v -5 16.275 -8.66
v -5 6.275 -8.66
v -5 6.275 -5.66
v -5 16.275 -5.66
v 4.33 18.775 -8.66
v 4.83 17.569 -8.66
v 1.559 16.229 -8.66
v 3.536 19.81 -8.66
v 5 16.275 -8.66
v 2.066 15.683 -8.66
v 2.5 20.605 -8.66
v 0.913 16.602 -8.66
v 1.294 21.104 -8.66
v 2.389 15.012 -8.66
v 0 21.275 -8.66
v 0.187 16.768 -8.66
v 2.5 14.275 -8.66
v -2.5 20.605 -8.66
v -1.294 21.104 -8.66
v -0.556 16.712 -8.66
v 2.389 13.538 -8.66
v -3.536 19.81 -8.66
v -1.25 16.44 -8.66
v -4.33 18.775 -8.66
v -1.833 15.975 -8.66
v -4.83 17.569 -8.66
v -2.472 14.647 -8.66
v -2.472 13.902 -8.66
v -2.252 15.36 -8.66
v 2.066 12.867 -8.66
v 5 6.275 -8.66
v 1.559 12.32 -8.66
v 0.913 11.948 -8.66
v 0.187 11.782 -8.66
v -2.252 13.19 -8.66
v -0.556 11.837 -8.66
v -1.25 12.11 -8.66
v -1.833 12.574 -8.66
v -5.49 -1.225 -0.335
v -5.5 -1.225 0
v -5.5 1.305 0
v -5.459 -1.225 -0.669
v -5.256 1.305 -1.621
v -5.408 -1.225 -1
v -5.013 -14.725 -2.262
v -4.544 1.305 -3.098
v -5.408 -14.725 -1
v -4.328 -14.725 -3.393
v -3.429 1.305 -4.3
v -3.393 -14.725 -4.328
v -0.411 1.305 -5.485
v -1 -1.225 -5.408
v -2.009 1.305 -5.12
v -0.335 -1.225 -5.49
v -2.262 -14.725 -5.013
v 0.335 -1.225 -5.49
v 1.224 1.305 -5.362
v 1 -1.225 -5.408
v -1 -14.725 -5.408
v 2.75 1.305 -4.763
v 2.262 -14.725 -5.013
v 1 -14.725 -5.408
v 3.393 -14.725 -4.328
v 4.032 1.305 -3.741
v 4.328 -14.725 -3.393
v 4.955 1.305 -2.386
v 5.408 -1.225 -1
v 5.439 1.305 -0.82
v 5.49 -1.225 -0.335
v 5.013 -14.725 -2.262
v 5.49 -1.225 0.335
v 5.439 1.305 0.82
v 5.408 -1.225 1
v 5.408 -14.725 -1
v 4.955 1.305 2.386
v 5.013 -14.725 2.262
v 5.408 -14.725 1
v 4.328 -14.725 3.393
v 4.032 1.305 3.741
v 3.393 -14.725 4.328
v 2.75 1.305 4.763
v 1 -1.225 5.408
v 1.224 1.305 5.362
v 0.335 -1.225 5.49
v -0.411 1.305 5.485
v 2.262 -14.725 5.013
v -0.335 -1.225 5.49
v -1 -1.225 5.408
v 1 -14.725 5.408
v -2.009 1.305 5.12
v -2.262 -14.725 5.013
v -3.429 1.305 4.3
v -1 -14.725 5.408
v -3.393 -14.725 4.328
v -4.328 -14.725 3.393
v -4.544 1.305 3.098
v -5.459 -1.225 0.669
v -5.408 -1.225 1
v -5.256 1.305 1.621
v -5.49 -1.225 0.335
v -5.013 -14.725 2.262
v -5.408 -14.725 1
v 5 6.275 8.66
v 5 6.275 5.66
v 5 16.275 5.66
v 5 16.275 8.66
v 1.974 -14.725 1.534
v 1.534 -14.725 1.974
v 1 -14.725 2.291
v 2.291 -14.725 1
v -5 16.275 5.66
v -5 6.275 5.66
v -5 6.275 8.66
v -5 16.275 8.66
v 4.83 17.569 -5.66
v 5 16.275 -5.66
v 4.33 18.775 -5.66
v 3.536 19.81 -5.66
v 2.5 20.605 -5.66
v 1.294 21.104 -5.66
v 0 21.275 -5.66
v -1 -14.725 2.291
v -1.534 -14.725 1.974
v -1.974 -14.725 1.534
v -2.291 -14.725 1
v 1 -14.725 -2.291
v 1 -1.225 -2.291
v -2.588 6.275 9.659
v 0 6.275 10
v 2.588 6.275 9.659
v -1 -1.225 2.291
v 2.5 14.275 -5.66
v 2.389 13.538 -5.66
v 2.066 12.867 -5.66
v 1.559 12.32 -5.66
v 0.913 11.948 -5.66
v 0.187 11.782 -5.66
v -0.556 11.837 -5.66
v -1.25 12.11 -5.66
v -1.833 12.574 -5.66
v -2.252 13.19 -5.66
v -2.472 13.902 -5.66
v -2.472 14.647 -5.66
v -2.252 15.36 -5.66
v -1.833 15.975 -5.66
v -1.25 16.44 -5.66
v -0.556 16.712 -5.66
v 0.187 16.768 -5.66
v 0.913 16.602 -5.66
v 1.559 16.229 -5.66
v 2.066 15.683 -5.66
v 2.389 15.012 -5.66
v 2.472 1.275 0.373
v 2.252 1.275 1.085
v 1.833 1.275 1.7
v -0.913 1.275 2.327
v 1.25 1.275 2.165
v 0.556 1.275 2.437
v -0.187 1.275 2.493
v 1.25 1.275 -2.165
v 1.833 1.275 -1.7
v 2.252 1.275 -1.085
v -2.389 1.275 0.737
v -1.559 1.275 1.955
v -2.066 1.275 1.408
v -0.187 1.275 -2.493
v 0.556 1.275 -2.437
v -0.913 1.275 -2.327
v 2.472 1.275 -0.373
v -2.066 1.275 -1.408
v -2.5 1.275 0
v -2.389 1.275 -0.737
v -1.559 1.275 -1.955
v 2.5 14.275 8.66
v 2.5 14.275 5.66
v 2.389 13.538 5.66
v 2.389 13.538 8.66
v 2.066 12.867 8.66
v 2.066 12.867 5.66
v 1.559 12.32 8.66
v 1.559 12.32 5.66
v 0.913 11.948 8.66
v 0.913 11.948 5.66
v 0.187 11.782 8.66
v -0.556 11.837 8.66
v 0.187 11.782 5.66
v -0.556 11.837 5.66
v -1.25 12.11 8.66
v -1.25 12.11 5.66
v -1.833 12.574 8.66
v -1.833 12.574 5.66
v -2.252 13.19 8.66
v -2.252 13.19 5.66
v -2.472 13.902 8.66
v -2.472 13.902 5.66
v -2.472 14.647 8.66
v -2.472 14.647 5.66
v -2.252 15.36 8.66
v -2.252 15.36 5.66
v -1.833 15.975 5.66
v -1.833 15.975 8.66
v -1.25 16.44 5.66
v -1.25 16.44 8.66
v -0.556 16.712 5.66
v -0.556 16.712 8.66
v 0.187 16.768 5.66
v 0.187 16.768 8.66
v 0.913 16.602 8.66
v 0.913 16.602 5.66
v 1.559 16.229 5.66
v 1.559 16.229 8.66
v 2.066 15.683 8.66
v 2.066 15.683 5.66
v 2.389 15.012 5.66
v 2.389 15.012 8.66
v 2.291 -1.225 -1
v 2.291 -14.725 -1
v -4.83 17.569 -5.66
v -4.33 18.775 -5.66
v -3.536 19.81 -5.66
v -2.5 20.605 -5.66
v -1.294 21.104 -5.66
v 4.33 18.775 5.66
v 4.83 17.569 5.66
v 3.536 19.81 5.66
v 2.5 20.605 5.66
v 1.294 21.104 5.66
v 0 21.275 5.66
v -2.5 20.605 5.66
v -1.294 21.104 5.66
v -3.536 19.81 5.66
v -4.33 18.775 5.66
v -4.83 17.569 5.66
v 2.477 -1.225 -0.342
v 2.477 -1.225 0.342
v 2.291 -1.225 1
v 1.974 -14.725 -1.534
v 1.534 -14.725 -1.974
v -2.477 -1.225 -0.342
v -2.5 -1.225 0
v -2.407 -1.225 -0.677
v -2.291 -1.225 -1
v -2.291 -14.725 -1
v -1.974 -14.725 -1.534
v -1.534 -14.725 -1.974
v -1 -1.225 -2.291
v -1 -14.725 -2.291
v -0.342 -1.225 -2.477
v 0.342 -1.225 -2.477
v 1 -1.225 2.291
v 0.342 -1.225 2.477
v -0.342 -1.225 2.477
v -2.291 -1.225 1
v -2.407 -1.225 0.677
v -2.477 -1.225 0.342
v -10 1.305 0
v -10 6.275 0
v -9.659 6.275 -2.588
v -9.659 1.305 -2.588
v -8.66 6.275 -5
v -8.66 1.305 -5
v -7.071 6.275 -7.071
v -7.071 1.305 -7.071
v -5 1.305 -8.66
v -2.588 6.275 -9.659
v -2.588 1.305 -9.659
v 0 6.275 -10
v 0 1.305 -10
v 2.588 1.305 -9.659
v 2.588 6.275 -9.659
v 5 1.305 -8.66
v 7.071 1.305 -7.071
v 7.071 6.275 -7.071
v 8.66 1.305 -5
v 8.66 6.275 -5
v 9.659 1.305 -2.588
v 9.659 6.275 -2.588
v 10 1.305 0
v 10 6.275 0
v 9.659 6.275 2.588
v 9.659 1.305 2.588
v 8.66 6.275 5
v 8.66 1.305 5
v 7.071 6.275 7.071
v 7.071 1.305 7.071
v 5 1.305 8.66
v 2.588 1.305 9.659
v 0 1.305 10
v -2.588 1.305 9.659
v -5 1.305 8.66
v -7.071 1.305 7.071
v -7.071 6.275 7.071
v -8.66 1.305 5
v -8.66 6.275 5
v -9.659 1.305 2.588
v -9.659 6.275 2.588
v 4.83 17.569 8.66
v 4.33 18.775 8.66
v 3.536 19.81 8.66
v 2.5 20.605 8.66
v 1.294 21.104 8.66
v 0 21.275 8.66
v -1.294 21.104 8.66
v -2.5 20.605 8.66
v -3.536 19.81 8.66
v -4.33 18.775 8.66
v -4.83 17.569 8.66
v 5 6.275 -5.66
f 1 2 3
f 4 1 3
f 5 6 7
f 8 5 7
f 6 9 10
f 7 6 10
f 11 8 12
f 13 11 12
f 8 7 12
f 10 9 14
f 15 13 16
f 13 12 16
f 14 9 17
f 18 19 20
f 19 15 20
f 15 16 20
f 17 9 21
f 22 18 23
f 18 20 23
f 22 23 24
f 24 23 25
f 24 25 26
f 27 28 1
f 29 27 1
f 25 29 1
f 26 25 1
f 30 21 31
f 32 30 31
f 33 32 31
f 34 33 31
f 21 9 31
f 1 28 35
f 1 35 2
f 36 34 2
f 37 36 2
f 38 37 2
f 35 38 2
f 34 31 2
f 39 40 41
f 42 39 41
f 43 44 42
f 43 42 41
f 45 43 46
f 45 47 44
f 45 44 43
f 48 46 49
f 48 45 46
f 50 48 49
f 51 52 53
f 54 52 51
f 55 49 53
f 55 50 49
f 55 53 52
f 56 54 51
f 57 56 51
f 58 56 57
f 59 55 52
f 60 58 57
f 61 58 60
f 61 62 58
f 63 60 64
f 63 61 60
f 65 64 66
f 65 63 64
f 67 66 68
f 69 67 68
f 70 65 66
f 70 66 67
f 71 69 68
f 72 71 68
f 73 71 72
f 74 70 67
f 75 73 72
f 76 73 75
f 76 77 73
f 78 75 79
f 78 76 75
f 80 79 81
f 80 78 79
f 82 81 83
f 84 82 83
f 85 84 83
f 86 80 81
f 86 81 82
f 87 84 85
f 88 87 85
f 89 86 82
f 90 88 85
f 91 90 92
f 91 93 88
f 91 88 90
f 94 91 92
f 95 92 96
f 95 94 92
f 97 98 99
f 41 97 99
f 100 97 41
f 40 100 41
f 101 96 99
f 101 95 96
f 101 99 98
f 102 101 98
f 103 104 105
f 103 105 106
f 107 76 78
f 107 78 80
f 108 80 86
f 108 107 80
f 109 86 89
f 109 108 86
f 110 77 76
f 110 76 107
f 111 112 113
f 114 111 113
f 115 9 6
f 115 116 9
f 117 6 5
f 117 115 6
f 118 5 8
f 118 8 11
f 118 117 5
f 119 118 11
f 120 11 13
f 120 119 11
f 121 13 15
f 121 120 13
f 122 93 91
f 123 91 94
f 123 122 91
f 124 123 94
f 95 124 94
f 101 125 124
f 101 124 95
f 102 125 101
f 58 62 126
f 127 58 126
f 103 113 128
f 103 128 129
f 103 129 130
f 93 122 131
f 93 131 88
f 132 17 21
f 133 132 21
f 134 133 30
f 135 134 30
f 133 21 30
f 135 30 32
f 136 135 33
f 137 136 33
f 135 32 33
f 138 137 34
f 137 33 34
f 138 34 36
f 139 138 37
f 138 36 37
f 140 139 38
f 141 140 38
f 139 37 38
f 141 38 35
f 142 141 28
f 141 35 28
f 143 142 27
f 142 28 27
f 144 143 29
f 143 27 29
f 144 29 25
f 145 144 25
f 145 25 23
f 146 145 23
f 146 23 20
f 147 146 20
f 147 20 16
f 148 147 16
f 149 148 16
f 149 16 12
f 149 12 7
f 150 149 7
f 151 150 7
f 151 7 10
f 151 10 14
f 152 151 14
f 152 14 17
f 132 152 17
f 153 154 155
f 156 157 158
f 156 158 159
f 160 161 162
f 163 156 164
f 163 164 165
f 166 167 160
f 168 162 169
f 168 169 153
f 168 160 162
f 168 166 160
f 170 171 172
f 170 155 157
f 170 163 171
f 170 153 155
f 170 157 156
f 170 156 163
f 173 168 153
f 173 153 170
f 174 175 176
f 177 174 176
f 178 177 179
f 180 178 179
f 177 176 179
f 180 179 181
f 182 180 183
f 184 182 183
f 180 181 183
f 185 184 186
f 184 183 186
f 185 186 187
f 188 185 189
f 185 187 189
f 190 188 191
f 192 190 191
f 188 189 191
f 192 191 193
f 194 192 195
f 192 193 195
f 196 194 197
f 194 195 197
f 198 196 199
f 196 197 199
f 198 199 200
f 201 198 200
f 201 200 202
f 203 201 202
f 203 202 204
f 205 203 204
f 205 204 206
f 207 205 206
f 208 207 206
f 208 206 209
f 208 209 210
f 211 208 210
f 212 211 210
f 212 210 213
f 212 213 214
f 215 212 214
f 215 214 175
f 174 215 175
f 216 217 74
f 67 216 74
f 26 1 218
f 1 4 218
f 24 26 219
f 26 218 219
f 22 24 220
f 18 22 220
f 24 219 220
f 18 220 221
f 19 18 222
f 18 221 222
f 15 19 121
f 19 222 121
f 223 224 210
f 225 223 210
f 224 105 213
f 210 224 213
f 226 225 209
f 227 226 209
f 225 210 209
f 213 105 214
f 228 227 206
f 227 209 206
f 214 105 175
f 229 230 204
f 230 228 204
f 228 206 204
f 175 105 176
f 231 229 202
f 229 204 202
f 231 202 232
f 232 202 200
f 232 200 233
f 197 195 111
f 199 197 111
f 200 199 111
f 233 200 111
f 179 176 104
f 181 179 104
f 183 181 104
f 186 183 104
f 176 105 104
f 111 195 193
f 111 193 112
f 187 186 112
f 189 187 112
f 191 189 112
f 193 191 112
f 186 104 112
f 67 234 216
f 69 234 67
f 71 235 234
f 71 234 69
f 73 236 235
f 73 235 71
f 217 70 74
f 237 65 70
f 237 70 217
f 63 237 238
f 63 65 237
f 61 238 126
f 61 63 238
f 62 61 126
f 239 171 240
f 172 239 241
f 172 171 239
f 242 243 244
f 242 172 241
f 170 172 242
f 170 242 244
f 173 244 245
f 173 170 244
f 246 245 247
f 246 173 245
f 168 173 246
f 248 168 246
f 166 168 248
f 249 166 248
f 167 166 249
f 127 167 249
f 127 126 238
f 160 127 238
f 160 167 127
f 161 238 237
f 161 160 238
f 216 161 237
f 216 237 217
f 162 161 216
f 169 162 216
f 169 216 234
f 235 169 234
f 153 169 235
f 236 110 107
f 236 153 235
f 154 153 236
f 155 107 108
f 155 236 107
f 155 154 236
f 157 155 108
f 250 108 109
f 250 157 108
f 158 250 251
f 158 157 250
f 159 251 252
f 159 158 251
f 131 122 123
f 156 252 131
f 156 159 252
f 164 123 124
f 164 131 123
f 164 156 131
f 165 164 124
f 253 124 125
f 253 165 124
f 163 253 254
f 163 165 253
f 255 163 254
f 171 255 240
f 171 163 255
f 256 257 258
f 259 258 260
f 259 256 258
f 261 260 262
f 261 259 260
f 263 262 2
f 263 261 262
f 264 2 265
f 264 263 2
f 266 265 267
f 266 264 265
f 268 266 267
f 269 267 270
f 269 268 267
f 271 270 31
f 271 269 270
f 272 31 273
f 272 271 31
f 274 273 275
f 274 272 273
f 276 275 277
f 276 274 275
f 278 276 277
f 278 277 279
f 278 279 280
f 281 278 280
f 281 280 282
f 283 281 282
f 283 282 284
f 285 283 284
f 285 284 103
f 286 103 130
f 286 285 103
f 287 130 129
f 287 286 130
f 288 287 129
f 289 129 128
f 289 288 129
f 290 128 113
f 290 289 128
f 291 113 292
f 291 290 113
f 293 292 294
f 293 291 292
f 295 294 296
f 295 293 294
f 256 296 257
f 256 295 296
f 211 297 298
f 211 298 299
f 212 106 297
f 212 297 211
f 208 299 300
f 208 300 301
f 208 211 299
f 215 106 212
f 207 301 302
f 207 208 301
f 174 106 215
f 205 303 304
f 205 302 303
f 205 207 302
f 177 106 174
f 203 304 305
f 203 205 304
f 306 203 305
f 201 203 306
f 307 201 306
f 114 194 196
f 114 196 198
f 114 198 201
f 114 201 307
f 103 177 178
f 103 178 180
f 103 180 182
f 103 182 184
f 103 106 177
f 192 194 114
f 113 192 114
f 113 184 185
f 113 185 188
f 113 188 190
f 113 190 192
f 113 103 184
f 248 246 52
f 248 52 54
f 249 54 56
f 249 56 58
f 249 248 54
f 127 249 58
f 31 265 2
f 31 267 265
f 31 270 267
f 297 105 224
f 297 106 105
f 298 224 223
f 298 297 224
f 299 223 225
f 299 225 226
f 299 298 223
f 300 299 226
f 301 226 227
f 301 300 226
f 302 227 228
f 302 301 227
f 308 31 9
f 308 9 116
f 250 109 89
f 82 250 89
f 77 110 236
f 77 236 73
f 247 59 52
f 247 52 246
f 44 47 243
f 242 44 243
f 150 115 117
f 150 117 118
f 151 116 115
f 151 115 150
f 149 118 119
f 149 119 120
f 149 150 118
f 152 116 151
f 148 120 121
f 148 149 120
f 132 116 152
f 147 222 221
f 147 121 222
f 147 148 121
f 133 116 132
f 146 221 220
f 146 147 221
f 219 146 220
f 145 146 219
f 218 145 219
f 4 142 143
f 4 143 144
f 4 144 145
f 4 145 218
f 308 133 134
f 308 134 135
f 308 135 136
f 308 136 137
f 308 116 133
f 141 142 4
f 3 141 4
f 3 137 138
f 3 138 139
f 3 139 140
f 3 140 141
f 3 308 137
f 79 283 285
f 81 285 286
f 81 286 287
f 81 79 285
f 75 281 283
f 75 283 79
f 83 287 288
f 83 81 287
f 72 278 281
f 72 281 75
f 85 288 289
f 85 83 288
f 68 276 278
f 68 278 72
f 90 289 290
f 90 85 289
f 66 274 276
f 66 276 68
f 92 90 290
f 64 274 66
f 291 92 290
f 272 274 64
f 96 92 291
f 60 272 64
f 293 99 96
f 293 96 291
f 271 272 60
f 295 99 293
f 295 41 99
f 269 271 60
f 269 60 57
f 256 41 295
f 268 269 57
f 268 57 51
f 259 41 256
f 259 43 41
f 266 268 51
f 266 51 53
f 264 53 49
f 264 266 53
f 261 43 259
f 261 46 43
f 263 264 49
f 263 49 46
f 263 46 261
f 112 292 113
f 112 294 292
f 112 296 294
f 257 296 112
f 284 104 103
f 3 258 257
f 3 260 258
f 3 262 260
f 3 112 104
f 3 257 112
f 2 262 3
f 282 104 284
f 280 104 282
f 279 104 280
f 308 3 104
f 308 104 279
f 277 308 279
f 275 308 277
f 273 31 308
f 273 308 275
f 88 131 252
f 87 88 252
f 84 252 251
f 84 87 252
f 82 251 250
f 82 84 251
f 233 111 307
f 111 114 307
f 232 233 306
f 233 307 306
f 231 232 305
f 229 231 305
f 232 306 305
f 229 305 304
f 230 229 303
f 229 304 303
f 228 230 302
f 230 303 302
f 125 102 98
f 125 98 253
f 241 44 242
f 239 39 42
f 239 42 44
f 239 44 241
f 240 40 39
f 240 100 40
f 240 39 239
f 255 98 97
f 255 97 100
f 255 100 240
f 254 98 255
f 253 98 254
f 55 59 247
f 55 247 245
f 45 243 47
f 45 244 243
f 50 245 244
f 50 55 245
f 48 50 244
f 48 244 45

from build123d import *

# Parameters (mm, degrees)
F2_W     = 10
F2_H     = 3
F3_DEPTH = 15
F4_R     = 4.99999
F5_R     = 2.5
F6_DEPTH = 18.6612540378
F7_W     = 2
F7_H     = 5
F7_W_2   = 5
F7_H_2   = 2
F8_DEPTH = 13.5


# Not quite as in the source:
# - a fillet or chamfer is up to 0.001 mm smaller than in the source, because OpenCascade refuses the exact size


with BuildPart() as f1:
    # F0 (on Top) → F1 (revolve)
    with BuildSketch(Plane.XY):
        Polygon((0, 6.2748147342), (-10, 6.2748147342), (-10, 1.304778154), (-5.5, 1.304778154), (-5.5, -14.7251852658), (-2.5, -14.7251852658), (-2.5, 1.2748147342), (0, 1.2748147342), align=None)
    revolve(axis=Axis((0, 3.7748147342, 0), (0, -1, 0)))

    # F2 (on face) → F3 (join)
    with BuildSketch(Plane(origin=(0, 6.2748147342, 0), x_dir=(-1, 0, 0), z_dir=(0, 1, 0))):
        with Locations((0, 7.1602540378)):
            Rectangle(F2_W, F2_H)
        with Locations((0, -7.1602540378)):
            Rectangle(F2_W, F2_H)
    extrude(amount=F3_DEPTH)

    # F4 (radius 5 in the source; OpenCascade refuses exactly that, so slightly less here)
    f4_edges = [f1.edges().sort_by_distance(p)[0] for p in [
        (-5, 21.274815, -7.160254),
        (5, 21.274815, -7.160254),
        (5, 21.274815, 7.160254),
        (-5, 21.274815, 7.160254),
    ]]
    fillet(f4_edges, radius=F4_R)

    # F5 (on face) → F6 (cut, through all)
    with BuildSketch(Plane(origin=(0, 0, -8.6602540378), x_dir=(1, 0, 0), z_dir=(0, 0, -1))):
        with Locations((0, -14.2748147342)):
            Circle(F5_R)
    extrude(amount=-F6_DEPTH, mode=Mode.SUBTRACT)

    # F7 (on face) → F8 (cut)
    with BuildSketch(Plane.XZ.offset(14.7251852658)):
        with Locations((0, 3.7191687186)):
            Rectangle(F7_W, F7_H)
        with Locations((-3.7191687186, 0)):
            Rectangle(F7_W_2, F7_H_2)
        with Locations((0, -3.7191687186)):
            Rectangle(F7_W, F7_H)
        with Locations((3.7191687186, 0)):
            Rectangle(F7_W_2, F7_H_2)
    extrude(amount=-F8_DEPTH, mode=Mode.SUBTRACT)


solid = f1.part
